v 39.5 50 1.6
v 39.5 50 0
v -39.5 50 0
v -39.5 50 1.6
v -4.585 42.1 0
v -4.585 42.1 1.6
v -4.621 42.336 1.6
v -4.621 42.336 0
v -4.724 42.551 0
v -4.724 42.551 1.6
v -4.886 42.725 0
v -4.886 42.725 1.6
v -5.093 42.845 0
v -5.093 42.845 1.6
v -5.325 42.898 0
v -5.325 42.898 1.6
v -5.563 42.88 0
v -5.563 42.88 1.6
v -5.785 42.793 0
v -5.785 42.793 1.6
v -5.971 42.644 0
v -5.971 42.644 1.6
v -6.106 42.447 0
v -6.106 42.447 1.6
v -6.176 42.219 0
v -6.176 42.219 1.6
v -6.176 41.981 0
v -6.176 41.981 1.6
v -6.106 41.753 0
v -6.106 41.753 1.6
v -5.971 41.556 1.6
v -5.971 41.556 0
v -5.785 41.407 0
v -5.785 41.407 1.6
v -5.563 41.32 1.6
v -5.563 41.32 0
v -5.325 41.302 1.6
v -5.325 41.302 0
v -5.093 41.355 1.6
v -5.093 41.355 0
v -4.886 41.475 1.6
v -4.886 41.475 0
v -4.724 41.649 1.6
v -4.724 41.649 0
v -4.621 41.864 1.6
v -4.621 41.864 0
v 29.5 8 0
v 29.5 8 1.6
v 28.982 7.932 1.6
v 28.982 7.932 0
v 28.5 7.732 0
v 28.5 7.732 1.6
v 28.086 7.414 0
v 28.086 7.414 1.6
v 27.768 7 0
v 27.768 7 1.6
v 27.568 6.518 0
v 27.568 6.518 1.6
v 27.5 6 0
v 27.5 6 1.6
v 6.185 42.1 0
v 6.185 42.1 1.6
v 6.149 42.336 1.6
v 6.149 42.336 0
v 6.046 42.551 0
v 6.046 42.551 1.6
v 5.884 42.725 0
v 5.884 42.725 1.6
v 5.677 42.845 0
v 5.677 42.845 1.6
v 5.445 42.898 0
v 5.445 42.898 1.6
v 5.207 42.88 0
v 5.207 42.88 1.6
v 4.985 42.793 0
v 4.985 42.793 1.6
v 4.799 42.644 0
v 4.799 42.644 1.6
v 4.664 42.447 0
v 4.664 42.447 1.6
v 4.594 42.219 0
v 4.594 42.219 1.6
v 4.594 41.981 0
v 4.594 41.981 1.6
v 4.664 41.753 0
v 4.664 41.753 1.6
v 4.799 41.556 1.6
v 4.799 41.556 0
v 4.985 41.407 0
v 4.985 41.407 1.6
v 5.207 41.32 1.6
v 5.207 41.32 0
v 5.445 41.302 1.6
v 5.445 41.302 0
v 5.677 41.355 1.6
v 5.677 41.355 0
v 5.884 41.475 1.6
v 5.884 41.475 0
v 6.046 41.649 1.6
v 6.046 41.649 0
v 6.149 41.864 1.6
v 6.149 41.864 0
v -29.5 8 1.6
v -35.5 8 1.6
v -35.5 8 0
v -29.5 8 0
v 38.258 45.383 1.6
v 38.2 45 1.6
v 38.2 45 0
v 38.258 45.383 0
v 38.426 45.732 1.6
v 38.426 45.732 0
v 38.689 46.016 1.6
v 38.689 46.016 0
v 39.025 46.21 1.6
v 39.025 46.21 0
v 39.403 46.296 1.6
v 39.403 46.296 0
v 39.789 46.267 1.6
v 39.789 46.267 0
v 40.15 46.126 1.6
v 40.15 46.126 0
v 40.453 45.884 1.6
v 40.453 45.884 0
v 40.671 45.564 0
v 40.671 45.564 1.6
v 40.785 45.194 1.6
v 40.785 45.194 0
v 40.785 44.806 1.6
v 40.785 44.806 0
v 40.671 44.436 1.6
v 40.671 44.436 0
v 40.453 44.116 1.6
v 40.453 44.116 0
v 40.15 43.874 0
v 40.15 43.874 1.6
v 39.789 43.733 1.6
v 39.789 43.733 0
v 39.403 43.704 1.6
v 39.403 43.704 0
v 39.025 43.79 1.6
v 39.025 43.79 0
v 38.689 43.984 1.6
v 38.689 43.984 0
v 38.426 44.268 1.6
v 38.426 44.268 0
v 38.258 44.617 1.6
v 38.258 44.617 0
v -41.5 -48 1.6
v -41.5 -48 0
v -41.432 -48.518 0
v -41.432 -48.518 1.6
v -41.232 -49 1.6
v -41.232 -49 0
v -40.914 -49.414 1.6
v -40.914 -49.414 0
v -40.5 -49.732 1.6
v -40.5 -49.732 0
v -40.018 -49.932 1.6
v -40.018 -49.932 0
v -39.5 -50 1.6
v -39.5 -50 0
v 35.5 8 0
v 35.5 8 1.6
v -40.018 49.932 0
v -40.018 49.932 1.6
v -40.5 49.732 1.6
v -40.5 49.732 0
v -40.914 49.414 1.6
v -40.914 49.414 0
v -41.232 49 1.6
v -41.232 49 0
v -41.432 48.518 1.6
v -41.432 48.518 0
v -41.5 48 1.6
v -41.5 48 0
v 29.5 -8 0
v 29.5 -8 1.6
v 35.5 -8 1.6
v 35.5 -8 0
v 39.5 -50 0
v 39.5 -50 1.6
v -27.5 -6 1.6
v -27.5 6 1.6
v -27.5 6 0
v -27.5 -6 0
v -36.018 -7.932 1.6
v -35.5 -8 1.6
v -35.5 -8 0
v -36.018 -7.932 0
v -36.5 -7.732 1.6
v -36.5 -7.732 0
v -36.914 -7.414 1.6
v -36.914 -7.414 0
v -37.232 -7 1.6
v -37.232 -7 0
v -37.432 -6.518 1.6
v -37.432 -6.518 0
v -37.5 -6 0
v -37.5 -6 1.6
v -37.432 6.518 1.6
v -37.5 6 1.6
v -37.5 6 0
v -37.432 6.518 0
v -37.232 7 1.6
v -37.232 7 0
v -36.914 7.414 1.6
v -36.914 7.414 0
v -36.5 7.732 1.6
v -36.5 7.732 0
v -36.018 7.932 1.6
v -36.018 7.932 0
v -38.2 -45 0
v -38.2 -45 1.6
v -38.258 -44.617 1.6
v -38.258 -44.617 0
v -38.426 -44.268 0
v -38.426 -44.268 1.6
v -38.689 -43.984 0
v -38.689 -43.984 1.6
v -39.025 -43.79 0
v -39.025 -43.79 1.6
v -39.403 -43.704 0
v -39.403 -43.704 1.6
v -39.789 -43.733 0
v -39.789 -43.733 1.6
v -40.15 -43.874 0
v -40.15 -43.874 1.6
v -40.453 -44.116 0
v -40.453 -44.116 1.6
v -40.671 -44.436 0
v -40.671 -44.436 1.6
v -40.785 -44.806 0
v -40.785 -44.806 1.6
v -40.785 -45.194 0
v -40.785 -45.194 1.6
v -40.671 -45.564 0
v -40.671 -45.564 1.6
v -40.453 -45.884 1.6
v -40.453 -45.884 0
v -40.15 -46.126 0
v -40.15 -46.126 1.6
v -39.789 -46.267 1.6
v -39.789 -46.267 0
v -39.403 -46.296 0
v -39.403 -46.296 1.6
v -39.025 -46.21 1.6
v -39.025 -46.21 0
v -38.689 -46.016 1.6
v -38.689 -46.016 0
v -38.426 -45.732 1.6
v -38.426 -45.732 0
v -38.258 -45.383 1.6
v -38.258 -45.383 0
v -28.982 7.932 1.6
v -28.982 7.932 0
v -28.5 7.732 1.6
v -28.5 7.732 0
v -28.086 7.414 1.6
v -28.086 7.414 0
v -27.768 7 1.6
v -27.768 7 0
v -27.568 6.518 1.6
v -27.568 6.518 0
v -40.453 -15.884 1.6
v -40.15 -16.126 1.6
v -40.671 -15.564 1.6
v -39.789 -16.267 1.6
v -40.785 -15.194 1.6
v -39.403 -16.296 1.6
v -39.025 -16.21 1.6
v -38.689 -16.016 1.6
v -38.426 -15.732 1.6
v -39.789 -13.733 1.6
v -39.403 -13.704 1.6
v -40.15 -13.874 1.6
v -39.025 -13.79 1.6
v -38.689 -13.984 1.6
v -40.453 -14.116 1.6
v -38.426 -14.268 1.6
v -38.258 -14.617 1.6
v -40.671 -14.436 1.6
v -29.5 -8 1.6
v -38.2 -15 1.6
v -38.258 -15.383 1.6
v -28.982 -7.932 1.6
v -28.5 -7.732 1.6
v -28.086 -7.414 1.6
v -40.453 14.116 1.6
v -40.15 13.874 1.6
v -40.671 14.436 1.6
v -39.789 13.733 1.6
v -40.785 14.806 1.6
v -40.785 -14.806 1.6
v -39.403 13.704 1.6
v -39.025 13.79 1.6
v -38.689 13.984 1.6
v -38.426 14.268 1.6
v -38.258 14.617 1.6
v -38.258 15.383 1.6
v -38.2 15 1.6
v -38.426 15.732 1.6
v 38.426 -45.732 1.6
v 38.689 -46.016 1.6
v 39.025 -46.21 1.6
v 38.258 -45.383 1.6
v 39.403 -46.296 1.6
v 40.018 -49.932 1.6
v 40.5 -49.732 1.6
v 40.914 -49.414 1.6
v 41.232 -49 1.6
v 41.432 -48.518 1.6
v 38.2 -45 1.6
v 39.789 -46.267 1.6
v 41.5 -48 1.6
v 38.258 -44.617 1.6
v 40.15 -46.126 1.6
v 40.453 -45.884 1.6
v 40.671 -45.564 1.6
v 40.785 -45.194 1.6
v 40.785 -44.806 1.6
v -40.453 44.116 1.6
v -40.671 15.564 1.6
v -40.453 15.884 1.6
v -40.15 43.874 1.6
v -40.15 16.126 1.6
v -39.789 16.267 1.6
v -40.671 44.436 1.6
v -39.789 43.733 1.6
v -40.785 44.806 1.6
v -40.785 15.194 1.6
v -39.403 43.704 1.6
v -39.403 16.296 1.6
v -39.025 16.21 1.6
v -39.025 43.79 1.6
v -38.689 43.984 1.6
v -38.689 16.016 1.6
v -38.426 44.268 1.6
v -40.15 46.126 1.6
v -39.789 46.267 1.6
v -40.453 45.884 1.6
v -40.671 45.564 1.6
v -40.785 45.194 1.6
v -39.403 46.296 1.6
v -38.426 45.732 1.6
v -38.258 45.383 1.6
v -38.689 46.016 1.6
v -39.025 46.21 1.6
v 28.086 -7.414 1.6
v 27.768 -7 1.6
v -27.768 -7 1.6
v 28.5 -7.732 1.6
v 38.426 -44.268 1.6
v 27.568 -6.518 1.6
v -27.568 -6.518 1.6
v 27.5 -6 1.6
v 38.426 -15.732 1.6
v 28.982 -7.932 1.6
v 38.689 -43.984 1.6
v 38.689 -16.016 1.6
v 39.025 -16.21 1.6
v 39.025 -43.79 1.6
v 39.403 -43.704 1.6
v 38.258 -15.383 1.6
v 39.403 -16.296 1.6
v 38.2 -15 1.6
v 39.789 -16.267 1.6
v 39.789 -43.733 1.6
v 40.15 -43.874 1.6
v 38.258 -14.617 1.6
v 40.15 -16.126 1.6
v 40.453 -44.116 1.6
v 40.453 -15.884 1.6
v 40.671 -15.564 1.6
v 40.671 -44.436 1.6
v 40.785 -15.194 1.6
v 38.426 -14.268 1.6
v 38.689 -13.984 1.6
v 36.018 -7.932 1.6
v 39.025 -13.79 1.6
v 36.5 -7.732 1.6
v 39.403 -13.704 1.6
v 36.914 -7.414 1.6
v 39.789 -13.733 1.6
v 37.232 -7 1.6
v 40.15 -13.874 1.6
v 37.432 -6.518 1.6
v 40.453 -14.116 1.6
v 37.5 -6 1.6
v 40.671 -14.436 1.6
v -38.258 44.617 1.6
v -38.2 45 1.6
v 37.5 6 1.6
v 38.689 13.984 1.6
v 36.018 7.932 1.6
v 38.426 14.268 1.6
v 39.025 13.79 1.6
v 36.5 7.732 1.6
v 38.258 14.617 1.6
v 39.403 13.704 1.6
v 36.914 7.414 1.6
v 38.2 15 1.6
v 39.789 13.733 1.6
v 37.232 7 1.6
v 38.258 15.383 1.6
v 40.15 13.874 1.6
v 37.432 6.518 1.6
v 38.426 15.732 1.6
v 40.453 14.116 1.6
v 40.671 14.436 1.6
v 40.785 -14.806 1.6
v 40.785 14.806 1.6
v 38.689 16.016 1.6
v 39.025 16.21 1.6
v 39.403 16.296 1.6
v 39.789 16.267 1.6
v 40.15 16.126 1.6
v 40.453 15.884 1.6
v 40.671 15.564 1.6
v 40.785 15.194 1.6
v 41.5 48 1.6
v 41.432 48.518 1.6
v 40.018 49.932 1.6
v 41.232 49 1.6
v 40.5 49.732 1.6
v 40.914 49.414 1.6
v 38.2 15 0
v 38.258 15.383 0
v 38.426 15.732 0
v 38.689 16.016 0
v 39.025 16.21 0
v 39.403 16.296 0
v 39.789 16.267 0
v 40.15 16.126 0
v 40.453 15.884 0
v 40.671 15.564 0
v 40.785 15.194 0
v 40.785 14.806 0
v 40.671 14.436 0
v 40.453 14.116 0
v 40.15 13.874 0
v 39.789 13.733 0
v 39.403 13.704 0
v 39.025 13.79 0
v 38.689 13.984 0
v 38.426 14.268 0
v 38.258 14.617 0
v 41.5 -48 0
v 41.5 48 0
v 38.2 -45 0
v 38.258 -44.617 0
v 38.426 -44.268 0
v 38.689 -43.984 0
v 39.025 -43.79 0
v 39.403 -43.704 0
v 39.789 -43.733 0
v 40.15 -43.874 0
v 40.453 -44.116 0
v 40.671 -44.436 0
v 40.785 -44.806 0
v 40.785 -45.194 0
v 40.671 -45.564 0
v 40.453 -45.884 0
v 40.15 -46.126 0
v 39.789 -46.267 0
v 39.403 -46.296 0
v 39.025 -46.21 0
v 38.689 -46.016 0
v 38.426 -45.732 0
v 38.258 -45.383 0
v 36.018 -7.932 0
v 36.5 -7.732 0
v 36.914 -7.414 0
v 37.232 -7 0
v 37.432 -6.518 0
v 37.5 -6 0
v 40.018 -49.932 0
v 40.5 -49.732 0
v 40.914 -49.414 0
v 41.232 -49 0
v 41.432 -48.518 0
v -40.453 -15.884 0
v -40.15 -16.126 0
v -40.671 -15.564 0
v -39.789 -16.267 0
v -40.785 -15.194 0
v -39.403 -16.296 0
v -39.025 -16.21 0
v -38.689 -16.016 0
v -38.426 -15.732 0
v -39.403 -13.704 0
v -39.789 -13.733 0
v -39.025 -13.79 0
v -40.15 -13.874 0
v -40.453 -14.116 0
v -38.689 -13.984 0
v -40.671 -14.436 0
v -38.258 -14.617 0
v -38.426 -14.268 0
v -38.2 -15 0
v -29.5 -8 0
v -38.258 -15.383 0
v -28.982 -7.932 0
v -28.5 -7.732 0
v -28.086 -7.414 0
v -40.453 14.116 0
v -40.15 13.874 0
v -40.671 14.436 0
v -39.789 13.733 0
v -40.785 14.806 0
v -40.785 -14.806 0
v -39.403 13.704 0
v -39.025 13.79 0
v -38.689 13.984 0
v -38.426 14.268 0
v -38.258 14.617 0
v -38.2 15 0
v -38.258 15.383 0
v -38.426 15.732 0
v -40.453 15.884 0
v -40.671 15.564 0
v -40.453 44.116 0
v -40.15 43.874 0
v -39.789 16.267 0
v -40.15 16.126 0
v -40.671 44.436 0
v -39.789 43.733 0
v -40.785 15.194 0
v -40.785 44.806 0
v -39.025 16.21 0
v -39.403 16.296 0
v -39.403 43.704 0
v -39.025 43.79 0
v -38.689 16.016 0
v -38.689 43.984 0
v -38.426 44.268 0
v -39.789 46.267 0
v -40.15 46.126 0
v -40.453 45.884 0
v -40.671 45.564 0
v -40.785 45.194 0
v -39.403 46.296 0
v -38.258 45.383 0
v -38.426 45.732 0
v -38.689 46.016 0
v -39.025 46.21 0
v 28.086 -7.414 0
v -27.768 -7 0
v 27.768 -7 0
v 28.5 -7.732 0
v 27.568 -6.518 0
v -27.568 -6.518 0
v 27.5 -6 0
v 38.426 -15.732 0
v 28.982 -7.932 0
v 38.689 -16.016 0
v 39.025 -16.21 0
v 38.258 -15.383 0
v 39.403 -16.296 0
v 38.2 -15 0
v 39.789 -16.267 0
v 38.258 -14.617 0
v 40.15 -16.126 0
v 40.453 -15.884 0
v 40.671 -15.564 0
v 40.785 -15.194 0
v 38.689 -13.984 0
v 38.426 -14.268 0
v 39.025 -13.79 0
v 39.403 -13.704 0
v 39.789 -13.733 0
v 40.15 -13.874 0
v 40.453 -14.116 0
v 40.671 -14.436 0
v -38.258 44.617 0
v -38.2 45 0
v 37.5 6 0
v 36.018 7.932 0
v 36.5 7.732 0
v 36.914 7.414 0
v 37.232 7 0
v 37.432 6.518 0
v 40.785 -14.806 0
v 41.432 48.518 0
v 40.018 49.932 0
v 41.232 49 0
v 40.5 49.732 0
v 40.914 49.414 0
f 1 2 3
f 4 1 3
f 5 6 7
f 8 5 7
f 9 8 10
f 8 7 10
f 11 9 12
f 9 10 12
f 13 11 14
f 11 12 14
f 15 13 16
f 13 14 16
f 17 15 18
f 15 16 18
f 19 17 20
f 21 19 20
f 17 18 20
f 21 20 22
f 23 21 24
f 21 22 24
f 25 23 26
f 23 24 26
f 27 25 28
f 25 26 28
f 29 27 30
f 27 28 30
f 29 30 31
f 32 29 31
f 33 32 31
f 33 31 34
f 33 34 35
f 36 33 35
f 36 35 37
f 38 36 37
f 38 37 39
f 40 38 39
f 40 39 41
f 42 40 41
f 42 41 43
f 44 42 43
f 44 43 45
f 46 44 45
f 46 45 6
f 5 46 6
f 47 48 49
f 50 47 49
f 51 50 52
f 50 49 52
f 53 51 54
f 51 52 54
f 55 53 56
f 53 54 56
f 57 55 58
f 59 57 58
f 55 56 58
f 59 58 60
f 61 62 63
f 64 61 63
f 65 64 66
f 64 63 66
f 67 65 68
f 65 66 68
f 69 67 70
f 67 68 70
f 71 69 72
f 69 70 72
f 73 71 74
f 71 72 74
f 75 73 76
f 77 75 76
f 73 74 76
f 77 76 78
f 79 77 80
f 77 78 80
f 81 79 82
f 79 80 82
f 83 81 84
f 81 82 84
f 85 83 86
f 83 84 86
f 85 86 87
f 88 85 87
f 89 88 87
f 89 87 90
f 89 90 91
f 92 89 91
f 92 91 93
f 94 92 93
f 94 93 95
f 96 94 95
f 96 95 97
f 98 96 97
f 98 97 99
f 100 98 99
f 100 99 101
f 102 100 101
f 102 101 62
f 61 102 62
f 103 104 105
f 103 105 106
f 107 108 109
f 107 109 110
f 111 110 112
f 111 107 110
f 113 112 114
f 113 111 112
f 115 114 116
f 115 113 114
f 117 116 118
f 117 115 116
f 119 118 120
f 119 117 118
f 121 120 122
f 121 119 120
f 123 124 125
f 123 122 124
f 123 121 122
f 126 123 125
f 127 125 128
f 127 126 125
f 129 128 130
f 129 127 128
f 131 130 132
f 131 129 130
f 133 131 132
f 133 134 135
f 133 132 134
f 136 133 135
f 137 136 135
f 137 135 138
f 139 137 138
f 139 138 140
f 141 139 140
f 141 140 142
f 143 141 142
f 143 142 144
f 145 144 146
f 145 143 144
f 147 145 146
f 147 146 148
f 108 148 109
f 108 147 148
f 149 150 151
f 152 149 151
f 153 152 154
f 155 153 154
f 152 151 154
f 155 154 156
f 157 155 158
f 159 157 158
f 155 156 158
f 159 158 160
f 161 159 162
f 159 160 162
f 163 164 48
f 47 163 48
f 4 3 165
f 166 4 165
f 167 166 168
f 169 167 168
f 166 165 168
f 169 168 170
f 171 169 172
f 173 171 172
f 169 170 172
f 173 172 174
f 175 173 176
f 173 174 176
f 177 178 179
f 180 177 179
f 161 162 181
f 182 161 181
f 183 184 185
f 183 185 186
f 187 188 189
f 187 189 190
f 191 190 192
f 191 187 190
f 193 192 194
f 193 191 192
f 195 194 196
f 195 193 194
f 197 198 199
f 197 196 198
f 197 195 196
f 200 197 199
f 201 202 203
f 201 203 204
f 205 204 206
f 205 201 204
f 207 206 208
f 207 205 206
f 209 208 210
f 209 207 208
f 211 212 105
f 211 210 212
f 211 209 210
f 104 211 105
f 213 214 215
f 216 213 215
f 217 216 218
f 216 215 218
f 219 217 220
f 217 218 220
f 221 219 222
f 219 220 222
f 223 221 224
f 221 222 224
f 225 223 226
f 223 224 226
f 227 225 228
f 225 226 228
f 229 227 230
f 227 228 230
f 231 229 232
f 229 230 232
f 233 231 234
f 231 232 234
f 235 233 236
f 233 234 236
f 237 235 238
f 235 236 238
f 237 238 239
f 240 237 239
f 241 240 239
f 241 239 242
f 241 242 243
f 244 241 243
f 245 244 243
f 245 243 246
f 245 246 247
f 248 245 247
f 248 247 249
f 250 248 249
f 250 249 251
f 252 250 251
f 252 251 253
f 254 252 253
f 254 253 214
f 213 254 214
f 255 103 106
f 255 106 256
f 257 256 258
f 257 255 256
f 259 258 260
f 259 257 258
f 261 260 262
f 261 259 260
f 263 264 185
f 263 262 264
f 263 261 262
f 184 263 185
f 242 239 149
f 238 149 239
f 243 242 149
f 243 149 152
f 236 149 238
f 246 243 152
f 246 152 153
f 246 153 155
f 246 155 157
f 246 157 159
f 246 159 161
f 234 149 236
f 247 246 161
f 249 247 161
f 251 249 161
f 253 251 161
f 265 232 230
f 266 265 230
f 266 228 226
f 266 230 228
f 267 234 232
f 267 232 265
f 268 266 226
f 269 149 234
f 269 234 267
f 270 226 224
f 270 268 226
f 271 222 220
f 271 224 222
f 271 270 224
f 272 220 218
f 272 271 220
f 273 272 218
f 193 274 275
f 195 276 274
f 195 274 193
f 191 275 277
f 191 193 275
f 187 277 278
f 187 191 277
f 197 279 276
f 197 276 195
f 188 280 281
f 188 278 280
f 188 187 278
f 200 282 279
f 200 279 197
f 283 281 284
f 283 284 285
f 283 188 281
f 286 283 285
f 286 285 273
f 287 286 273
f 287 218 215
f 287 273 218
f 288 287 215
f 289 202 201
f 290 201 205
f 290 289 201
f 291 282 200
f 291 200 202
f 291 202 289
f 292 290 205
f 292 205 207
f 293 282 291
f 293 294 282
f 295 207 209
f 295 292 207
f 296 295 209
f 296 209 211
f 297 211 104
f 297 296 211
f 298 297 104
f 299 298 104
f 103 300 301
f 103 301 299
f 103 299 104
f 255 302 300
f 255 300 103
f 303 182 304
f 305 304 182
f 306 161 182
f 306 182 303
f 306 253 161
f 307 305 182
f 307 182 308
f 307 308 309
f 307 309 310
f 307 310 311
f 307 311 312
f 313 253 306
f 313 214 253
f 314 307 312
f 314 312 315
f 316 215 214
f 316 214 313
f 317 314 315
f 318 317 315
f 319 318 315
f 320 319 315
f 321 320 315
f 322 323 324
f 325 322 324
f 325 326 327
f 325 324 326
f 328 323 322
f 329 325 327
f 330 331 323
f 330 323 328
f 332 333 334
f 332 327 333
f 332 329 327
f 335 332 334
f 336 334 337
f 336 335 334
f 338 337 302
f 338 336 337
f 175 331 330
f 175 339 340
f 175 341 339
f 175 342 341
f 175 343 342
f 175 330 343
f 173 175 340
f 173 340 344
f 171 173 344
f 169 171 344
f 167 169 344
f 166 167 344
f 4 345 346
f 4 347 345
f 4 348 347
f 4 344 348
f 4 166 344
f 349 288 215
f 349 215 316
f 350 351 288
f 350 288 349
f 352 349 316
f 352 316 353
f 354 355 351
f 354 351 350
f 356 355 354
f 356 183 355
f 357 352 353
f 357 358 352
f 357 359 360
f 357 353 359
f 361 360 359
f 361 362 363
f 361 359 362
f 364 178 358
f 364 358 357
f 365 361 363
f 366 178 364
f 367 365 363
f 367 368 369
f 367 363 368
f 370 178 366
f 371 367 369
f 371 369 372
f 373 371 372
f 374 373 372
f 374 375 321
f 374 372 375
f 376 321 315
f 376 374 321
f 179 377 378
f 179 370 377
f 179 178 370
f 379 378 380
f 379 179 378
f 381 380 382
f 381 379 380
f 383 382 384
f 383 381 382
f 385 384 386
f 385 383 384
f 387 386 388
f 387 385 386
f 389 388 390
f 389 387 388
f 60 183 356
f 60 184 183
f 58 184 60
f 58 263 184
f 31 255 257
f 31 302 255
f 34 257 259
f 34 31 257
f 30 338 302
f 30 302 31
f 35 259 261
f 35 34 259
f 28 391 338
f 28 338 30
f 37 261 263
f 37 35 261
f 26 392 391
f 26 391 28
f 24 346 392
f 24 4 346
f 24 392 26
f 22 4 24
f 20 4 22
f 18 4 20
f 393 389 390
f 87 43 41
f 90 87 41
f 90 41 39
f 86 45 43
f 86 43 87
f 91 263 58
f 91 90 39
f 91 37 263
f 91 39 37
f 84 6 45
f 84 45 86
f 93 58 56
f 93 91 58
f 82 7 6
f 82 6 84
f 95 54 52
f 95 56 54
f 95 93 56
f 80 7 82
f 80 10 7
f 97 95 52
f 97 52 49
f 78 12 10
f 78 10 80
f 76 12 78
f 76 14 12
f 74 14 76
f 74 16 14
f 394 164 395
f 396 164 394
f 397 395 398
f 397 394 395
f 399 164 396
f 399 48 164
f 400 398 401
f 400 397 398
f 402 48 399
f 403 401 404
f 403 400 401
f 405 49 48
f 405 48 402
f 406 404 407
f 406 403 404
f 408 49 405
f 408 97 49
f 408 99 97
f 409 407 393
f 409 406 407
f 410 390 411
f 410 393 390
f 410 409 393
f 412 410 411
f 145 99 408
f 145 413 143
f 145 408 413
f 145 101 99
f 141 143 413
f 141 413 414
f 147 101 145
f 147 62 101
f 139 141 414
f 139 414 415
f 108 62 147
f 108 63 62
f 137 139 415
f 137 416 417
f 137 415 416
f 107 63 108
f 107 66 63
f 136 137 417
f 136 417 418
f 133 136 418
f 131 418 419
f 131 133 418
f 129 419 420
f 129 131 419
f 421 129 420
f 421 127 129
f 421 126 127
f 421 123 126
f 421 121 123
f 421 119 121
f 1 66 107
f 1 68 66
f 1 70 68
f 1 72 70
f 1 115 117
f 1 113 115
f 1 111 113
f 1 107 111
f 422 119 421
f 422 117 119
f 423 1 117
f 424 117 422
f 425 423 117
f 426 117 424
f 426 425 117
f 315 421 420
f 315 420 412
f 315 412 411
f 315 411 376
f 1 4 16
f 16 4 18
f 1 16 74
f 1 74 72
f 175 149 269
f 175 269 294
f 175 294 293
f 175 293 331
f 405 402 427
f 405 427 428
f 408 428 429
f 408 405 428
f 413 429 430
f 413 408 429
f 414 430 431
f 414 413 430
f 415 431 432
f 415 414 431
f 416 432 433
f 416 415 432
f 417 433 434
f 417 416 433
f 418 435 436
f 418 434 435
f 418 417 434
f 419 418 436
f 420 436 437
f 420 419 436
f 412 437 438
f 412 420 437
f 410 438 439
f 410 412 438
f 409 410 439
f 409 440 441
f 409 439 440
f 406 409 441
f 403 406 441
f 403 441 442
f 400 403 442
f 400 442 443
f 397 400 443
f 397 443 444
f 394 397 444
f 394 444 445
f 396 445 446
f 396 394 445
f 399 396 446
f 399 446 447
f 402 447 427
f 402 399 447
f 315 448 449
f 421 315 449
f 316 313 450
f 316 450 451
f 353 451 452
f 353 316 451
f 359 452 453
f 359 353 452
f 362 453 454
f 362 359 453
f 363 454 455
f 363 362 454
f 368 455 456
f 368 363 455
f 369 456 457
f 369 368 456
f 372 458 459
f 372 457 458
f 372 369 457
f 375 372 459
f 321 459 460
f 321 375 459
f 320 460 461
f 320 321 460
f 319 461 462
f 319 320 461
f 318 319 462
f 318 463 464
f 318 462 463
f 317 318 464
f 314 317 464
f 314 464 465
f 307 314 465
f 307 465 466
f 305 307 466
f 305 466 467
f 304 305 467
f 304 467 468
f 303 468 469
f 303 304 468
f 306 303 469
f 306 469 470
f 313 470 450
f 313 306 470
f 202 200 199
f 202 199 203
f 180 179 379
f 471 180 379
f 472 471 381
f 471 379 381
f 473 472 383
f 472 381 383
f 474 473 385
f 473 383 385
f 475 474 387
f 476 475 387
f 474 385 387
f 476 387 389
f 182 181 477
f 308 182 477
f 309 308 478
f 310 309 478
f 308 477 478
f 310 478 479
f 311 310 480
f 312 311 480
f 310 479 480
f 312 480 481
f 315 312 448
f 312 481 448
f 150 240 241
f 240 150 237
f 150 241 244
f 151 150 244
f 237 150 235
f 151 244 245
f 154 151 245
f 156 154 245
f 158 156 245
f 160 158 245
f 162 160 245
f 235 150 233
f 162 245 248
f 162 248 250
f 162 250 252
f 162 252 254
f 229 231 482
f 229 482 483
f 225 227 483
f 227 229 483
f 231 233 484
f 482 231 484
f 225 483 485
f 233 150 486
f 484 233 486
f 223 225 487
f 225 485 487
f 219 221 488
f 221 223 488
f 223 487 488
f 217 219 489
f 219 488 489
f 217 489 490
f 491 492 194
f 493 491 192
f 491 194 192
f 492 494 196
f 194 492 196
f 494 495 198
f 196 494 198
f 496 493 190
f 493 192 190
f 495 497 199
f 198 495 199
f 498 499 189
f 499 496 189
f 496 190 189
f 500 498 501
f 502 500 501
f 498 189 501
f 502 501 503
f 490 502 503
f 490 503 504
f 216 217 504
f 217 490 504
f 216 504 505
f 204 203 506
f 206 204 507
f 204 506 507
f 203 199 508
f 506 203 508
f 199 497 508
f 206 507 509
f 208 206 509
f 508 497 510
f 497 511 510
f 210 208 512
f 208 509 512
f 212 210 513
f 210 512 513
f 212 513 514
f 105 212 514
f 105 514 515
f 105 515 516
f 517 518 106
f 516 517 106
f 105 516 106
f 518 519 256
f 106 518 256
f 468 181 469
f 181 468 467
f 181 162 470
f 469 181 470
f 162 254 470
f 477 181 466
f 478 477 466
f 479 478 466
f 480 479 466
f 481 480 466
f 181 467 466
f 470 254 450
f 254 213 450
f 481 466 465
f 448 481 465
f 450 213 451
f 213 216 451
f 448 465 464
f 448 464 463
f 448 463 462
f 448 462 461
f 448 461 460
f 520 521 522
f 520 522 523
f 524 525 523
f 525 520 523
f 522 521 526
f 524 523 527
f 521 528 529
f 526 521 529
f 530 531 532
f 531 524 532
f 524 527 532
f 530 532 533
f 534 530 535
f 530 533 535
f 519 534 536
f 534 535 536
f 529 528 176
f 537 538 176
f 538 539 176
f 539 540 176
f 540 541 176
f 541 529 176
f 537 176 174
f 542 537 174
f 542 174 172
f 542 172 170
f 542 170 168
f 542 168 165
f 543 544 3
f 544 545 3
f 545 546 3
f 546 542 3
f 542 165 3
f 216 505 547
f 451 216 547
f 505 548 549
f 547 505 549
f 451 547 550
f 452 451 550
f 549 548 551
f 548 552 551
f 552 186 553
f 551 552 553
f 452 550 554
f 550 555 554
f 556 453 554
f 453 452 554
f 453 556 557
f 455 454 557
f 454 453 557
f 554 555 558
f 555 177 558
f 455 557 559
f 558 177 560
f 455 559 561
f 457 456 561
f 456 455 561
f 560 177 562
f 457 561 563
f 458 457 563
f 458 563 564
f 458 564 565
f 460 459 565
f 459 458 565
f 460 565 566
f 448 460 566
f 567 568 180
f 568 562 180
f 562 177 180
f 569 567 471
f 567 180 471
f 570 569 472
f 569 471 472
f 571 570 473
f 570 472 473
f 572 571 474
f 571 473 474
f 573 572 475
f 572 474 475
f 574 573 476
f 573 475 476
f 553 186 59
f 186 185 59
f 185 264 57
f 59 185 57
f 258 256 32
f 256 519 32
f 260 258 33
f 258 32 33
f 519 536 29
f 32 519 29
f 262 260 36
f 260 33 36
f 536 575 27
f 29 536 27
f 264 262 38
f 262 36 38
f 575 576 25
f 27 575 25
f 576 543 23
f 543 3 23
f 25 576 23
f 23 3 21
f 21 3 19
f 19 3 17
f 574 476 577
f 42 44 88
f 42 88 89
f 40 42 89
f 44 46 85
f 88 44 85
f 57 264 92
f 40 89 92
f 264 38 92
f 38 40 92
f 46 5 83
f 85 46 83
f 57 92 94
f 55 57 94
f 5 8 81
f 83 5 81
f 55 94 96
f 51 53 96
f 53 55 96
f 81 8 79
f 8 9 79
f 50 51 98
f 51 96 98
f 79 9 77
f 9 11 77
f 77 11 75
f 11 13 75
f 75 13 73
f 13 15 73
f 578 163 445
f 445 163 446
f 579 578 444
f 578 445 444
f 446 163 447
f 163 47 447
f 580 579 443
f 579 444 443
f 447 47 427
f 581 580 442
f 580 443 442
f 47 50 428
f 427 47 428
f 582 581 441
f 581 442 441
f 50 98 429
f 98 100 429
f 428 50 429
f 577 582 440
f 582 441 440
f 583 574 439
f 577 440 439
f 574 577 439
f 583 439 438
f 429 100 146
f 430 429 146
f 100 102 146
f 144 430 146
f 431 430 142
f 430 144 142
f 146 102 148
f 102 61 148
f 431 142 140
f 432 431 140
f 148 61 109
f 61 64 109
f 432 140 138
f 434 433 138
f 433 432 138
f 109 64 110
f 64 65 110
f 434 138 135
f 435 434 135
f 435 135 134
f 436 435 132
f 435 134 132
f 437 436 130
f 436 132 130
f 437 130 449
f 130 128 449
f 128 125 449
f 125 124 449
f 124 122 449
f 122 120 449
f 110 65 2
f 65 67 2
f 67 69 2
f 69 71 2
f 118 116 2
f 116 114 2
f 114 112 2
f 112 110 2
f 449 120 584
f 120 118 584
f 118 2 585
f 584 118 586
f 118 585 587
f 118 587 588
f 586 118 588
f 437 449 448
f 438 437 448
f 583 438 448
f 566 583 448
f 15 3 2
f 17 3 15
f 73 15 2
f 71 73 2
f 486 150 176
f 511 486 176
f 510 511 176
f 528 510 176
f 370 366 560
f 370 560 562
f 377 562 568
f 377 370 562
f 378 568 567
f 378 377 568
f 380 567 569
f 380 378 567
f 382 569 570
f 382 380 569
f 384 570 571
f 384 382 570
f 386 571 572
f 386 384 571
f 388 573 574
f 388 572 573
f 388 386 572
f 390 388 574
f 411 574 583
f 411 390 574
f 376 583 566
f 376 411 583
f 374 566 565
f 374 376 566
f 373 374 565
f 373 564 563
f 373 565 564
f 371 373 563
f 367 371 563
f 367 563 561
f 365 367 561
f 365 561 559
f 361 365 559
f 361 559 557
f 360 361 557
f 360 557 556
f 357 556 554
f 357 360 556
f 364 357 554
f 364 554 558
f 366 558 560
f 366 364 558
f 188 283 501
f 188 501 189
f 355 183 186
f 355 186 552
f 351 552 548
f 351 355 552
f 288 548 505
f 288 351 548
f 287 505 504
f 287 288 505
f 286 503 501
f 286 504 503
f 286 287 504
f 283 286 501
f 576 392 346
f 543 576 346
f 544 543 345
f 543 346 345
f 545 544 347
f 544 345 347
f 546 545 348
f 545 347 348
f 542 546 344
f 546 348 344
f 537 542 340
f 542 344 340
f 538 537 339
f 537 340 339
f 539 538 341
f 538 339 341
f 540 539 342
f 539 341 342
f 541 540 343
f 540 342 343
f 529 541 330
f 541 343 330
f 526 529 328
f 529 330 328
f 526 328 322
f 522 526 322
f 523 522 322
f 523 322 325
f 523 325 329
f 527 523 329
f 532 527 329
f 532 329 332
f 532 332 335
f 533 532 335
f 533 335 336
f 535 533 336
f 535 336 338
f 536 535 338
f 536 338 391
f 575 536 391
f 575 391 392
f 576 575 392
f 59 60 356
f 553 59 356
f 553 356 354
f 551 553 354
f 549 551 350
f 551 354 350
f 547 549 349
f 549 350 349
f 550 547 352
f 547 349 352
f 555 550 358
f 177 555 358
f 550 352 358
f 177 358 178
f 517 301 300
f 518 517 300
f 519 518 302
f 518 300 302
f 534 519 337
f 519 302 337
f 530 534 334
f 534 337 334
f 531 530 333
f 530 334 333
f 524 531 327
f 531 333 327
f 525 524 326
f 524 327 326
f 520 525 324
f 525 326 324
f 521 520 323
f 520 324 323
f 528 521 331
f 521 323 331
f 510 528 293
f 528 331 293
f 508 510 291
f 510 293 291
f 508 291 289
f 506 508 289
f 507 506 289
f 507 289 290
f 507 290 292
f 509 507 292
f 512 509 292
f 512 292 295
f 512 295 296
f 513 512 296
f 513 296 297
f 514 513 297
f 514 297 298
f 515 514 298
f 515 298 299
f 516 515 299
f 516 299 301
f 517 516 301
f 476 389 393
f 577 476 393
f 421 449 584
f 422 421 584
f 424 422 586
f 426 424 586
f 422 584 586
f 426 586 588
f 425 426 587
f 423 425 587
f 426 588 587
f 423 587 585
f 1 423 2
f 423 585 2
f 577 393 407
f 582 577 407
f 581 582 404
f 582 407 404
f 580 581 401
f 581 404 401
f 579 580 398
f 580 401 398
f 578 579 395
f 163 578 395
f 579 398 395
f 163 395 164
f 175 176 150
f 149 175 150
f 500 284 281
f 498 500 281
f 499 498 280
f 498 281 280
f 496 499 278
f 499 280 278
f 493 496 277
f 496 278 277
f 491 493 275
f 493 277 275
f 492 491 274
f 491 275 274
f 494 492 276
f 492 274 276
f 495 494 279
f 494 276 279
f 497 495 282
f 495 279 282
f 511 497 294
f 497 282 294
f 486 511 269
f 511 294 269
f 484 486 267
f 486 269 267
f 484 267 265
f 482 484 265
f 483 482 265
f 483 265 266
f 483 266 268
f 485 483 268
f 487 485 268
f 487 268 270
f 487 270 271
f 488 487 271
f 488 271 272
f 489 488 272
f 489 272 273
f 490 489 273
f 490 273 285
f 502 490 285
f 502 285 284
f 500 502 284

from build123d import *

# Parameters (mm, degrees)
BOARDOUTLINE_DEPTH   = 1.6
SKETCH2_R            = 0.8
COMPONENTHOLES_DEPTH = 2.6
WINDOWS_1SIDE_DEPTH  = 2.6
M2_CLEARANCE_HOLE1_D = 2.6


with BuildPart() as part:
    # Sketch1 → boardOutline (new body)
    with BuildSketch(Plane.XY):
        with BuildLine():
            Line((-39.5, -50), (39.5, -50))
            ThreePointArc((39.5, -50), (40.914213562, -49.414213562), (41.5, -48))
            Line((41.5, -48), (41.5, 48))
            ThreePointArc((41.5, 48), (40.914213562, 49.414213562), (39.5, 50))
            Line((39.5, 50), (-39.5, 50))
            ThreePointArc((-39.5, 50), (-40.914213562, 49.414213562), (-41.5, 48))
            Line((-41.5, 48), (-41.5, -48))
            ThreePointArc((-41.5, -48), (-40.914213562, -49.414213562), (-39.5, -50))
        make_face()
    extrude(amount=BOARDOUTLINE_DEPTH)

    # Sketch2 → componentHoles (cut, through all)
    with BuildSketch(Plane.XY.offset(1.6)):
        with Locations((-5.385, 42.1)):
            Circle(SKETCH2_R)
        with Locations((5.385, 42.1)):
            Circle(SKETCH2_R)
    extrude(amount=-COMPONENTHOLES_DEPTH, mode=Mode.SUBTRACT)

    # Sketch3 → windows_1side (cut, through all)
    with BuildSketch(Plane.XY.offset(1.6)):
        with BuildLine():
            Line((37.5, -6), (37.5, 6))
            ThreePointArc((37.5, 6), (36.914213562, 7.414213562), (35.5, 8))
            Line((35.5, 8), (29.5, 8))
            ThreePointArc((29.5, 8), (28.085786438, 7.414213562), (27.5, 6))
            Line((27.5, 6), (27.5, -6))
            ThreePointArc((27.5, -6), (28.085786438, -7.414213562), (29.5, -8))
            Line((29.5, -8), (35.5, -8))
            ThreePointArc((35.5, -8), (36.914213562, -7.414213562), (37.5, -6))
        make_face()
        with BuildLine():
            Line((-29.5, -8), (-35.5, -8))
            ThreePointArc((-35.5, -8), (-36.914213562, -7.414213562), (-37.5, -6))
            Line((-37.5, -6), (-37.5, 6))
            ThreePointArc((-37.5, 6), (-36.914213562, 7.414213562), (-35.5, 8))
            Line((-35.5, 8), (-29.5, 8))
            ThreePointArc((-29.5, 8), (-28.085786438, 7.414213562), (-27.5, 6))
            Line((-27.5, 6), (-27.5, -6))
            ThreePointArc((-27.5, -6), (-28.085786438, -7.414213562), (-29.5, -8))
        make_face()
    extrude(amount=-WINDOWS_1SIDE_DEPTH, mode=Mode.SUBTRACT)

    # M2 Clearance Hole1 (through all)
    with Locations(Plane(origin=(0, 0, 0), x_dir=(-1, 0, 0), z_dir=(0, 0, -1))):
        with Locations((39.5, 45), (39.5, -15), (39.5, -45), (39.5, 15)):
            m2_clearance_hole1 = Hole(M2_CLEARANCE_HOLE1_D / 2)

    # Mirror1: M2 Clearance Hole1 across plane
    add(m2_clearance_hole1.mirror(Plane(origin=(0, 0, 0), x_dir=(0, 0, 1), z_dir=(1, 0, 0))), mode=Mode.SUBTRACT)


solid = part.part
